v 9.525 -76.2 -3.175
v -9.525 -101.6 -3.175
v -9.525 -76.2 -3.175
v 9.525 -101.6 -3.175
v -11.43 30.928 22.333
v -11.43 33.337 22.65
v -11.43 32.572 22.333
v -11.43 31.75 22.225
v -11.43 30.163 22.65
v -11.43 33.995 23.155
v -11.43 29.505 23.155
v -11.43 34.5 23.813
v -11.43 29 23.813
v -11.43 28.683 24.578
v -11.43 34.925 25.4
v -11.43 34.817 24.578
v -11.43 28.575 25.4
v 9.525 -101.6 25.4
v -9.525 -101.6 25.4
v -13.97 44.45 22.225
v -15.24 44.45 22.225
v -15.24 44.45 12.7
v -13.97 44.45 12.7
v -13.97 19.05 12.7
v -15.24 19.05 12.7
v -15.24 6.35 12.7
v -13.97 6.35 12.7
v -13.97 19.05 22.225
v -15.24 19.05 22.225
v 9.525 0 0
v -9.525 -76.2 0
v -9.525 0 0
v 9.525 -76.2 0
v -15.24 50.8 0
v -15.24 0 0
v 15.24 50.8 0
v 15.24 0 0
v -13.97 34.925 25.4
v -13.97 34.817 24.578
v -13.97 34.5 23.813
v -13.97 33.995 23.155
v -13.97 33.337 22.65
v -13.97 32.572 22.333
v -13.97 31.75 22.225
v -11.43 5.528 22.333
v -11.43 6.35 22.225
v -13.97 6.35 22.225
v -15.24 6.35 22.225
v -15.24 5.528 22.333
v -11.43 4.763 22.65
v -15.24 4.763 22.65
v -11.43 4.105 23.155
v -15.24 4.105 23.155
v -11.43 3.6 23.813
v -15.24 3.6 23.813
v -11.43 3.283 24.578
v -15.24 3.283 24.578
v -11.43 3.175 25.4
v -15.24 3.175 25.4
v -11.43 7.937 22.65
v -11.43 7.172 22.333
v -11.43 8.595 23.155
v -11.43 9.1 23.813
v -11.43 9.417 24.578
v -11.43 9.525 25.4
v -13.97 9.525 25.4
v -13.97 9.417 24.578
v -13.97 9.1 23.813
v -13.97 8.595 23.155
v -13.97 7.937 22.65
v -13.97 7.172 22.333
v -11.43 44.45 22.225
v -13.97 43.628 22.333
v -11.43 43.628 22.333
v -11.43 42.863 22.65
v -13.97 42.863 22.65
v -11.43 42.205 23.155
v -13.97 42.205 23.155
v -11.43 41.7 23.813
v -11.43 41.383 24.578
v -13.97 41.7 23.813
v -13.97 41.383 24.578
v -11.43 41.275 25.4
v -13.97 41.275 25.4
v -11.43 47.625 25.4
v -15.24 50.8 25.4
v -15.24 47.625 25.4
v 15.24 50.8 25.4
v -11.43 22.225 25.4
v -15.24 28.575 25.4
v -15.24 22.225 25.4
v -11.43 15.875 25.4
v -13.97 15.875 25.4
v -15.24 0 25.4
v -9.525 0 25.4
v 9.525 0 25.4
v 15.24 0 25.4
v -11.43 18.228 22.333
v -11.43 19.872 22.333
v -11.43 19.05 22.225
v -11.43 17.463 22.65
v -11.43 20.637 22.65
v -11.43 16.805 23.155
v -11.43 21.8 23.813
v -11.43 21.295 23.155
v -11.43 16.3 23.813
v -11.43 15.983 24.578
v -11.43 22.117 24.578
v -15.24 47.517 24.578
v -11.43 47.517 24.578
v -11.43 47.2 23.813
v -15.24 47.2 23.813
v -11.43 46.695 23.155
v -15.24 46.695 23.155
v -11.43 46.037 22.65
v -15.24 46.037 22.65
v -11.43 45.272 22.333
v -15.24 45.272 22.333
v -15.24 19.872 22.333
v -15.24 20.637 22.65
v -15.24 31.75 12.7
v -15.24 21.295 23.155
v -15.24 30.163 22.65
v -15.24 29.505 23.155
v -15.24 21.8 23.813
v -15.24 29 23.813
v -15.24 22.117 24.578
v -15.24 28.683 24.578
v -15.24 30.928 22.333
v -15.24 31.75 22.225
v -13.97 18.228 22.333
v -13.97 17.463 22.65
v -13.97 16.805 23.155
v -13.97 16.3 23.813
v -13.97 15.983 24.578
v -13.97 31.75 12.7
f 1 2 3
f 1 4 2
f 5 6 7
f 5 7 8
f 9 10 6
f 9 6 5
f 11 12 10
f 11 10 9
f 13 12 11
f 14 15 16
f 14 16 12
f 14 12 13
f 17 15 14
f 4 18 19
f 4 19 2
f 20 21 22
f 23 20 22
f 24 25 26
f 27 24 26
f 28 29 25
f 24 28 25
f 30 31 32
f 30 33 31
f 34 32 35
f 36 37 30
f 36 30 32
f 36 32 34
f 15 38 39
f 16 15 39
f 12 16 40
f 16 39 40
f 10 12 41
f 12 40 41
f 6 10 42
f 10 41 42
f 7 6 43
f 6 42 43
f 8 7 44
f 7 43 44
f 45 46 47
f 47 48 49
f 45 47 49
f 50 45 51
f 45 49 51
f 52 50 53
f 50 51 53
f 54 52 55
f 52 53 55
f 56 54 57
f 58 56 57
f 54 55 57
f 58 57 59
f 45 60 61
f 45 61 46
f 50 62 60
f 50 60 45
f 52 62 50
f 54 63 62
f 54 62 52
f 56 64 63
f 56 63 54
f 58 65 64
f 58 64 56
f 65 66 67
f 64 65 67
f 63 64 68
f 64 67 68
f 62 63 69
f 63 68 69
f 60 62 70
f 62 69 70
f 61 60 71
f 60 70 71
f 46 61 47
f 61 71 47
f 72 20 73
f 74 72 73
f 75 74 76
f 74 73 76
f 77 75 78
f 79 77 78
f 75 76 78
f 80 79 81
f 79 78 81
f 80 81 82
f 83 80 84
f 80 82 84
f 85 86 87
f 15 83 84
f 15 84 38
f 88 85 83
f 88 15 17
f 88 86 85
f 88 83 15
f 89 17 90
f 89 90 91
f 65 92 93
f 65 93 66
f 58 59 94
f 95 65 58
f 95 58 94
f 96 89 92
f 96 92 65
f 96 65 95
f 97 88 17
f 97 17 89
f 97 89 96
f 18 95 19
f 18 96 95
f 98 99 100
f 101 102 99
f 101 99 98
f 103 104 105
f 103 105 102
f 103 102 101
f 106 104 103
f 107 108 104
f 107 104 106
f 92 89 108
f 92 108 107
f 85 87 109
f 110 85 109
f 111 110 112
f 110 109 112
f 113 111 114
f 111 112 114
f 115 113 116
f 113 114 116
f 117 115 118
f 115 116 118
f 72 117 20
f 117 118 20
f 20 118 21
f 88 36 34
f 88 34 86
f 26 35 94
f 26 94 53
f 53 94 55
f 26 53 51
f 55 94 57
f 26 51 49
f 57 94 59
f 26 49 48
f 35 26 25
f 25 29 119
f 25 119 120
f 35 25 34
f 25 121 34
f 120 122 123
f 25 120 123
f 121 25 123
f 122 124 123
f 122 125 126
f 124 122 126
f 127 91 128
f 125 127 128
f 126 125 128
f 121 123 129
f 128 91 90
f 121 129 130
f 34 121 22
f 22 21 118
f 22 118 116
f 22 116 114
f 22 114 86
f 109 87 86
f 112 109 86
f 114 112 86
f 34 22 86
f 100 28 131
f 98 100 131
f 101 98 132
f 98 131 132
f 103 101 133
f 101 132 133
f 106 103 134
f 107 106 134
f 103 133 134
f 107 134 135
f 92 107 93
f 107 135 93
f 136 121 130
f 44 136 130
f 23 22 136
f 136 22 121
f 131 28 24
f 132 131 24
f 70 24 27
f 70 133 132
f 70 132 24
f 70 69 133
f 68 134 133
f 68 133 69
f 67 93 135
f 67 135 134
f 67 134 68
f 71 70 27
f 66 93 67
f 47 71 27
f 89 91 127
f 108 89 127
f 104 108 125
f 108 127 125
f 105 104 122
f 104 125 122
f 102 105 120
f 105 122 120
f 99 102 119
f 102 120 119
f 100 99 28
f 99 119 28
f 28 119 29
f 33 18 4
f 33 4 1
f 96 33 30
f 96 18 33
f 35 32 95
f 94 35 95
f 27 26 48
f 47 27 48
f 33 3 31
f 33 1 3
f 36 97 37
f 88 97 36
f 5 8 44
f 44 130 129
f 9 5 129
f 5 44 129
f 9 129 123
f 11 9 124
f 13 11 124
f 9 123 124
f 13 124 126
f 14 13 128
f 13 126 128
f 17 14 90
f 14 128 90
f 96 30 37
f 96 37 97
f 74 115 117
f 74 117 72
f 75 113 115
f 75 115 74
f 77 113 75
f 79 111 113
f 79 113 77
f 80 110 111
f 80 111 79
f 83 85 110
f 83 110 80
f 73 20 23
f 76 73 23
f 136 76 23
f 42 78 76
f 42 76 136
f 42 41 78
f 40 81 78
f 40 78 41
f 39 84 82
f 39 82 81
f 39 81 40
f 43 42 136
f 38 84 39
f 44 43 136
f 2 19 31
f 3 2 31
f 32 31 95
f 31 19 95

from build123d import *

# Parameters (mm, degrees)
F0_W     = 76.2
F0_H     = 25.4
F1_DEPTH = 9.525
F0_W_2   = 50.8
F2_DEPTH = 15.24
F3_DEPTH = 15.24
F4_DEPTH = 9.525
F6_DEPTH = 1.27
F7_DEPTH = 3.81


with BuildPart() as f1:
    # F0 (on Right) → F1 (new body)
    with BuildSketch(Plane.YZ):
        with Locations((-38.1, 12.7)):
            Rectangle(F0_W, F0_H)
        Polygon((-76.2, -3.175), (-76.2, 0), (-76.2, 25.4), (-101.6, 25.4), (-101.6, -3.175), align=None)
    extrude(amount=F1_DEPTH)

    # F0 (on Right) → F2 (join)
    with BuildSketch(Plane.YZ):
        with Locations((25.4, 12.7)):
            Rectangle(F0_W_2, F0_H)
    extrude(amount=F2_DEPTH)

    # F0 (on Right) → F3 (join)
    with BuildSketch(Plane.YZ):
        with Locations((25.4, 12.7)):
            Rectangle(F0_W_2, F0_H)
    extrude(amount=-F3_DEPTH)

    # F0 (on Right) → F4 (join)
    with BuildSketch(Plane.YZ):
        with Locations((-38.1, 12.7)):
            Rectangle(F0_W, F0_H)
        Polygon((-76.2, -3.175), (-76.2, 0), (-76.2, 25.4), (-101.6, 25.4), (-101.6, -3.175), align=None)
    extrude(amount=-F4_DEPTH)

    # F5 (on face) → F6 (cut)
    with BuildSketch(Plane(origin=(-15.24, 0, 0), x_dir=(0, -1, 0), z_dir=(-1, 0, 0))):
        with BuildLine():
            ThreePointArc((-41.275, 25.4), (-42.204936, 23.154936), (-44.45, 22.225))
            Line((-44.45, 22.225), (-44.45, 12.7))
            Line((-44.45, 12.7), (-42.4688, 12.7))
            Line((-42.4688, 12.7), (-38.8366, 12.7))
            Line((-38.8366, 12.7), (-38.1, 12.7))
            Line((-38.1, 12.7), (-38.1, 25.4))
            Line((-38.1, 25.4), (-41.275, 25.4))
        make_face()
        with BuildLine():
            Line((-38.1, 12.7), (-35.2044, 12.7))
            Line((-35.2044, 12.7), (-31.75, 12.7))
            Line((-31.75, 12.7), (-31.75, 22.225))
            ThreePointArc((-31.75, 22.225), (-33.995064, 23.154936), (-34.925, 25.4))
            Line((-34.925, 25.4), (-38.1, 25.4))
            Line((-38.1, 25.4), (-38.1, 12.7))
        make_face()
        with BuildLine():
            Line((-19.05, 12.7), (-12.7, 12.7))
            Line((-12.7, 12.7), (-12.7, 25.4))
            Line((-12.7, 25.4), (-15.875, 25.4))
            ThreePointArc((-15.875, 25.4), (-16.804936, 23.154936), (-19.05, 22.225))
            Line((-19.05, 22.225), (-19.05, 12.7))
        make_face()
        with BuildLine():
            Line((-6.35, 12.7), (-6.35, 22.225))
            ThreePointArc((-6.35, 22.225), (-8.595064, 23.154936), (-9.525, 25.4))
            Line((-9.525, 25.4), (-12.7, 25.4))
            Line((-12.7, 25.4), (-12.7, 12.7))
            Line((-12.7, 12.7), (-6.35, 12.7))
        make_face()
    extrude(amount=-F6_DEPTH, mode=Mode.SUBTRACT)

    # F5 (on face) → F7 (cut)
    with BuildSketch(Plane(origin=(-15.24, 0, 0), x_dir=(0, -1, 0), z_dir=(-1, 0, 0))):
        with BuildLine():
            Line((-44.45, 25.4), (-47.625, 25.4))
            ThreePointArc((-47.625, 25.4), (-46.695064, 23.154936), (-44.45, 22.225))
            Line((-44.45, 22.225), (-44.45, 25.4))
        make_face()
        with BuildLine():
            Line((-41.275, 25.4), (-44.45, 25.4))
            Line((-44.45, 25.4), (-44.45, 22.225))
            ThreePointArc((-44.45, 22.225), (-42.204936, 23.154936), (-41.275, 25.4))
        make_face()
        with BuildLine():
            ThreePointArc((-34.925, 25.4), (-33.995064, 23.154936), (-31.75, 22.225))
            Line((-31.75, 22.225), (-31.75, 25.4))
            Line((-31.75, 25.4), (-34.925, 25.4))
        make_face()
        with BuildLine():
            ThreePointArc((-31.75, 22.225), (-29.504936, 23.154936), (-28.575, 25.4))
            Line((-28.575, 25.4), (-31.75, 25.4))
            Line((-31.75, 25.4), (-31.75, 22.225))
        make_face()
        with BuildLine():
            ThreePointArc((-22.225, 25.4), (-21.295064, 23.154936), (-19.05, 22.225))
            Line((-19.05, 22.225), (-19.05, 25.4))
            Line((-19.05, 25.4), (-22.225, 25.4))
        make_face()
        with BuildLine():
            ThreePointArc((-19.05, 22.225), (-16.804936, 23.154936), (-15.875, 25.4))
            Line((-15.875, 25.4), (-19.05, 25.4))
            Line((-19.05, 25.4), (-19.05, 22.225))
        make_face()
        with BuildLine():
            Line((-6.35, 22.225), (-6.35, 25.4))
            Line((-6.35, 25.4), (-9.525, 25.4))
            ThreePointArc((-9.525, 25.4), (-8.595064, 23.154936), (-6.35, 22.225))
        make_face()
        with BuildLine():
            ThreePointArc((-6.35, 22.225), (-4.104936, 23.154936), (-3.175, 25.4))
            Line((-3.175, 25.4), (-6.35, 25.4))
            Line((-6.35, 25.4), (-6.35, 22.225))
        make_face()
    extrude(amount=-F7_DEPTH, mode=Mode.SUBTRACT)


solid = f1.part
